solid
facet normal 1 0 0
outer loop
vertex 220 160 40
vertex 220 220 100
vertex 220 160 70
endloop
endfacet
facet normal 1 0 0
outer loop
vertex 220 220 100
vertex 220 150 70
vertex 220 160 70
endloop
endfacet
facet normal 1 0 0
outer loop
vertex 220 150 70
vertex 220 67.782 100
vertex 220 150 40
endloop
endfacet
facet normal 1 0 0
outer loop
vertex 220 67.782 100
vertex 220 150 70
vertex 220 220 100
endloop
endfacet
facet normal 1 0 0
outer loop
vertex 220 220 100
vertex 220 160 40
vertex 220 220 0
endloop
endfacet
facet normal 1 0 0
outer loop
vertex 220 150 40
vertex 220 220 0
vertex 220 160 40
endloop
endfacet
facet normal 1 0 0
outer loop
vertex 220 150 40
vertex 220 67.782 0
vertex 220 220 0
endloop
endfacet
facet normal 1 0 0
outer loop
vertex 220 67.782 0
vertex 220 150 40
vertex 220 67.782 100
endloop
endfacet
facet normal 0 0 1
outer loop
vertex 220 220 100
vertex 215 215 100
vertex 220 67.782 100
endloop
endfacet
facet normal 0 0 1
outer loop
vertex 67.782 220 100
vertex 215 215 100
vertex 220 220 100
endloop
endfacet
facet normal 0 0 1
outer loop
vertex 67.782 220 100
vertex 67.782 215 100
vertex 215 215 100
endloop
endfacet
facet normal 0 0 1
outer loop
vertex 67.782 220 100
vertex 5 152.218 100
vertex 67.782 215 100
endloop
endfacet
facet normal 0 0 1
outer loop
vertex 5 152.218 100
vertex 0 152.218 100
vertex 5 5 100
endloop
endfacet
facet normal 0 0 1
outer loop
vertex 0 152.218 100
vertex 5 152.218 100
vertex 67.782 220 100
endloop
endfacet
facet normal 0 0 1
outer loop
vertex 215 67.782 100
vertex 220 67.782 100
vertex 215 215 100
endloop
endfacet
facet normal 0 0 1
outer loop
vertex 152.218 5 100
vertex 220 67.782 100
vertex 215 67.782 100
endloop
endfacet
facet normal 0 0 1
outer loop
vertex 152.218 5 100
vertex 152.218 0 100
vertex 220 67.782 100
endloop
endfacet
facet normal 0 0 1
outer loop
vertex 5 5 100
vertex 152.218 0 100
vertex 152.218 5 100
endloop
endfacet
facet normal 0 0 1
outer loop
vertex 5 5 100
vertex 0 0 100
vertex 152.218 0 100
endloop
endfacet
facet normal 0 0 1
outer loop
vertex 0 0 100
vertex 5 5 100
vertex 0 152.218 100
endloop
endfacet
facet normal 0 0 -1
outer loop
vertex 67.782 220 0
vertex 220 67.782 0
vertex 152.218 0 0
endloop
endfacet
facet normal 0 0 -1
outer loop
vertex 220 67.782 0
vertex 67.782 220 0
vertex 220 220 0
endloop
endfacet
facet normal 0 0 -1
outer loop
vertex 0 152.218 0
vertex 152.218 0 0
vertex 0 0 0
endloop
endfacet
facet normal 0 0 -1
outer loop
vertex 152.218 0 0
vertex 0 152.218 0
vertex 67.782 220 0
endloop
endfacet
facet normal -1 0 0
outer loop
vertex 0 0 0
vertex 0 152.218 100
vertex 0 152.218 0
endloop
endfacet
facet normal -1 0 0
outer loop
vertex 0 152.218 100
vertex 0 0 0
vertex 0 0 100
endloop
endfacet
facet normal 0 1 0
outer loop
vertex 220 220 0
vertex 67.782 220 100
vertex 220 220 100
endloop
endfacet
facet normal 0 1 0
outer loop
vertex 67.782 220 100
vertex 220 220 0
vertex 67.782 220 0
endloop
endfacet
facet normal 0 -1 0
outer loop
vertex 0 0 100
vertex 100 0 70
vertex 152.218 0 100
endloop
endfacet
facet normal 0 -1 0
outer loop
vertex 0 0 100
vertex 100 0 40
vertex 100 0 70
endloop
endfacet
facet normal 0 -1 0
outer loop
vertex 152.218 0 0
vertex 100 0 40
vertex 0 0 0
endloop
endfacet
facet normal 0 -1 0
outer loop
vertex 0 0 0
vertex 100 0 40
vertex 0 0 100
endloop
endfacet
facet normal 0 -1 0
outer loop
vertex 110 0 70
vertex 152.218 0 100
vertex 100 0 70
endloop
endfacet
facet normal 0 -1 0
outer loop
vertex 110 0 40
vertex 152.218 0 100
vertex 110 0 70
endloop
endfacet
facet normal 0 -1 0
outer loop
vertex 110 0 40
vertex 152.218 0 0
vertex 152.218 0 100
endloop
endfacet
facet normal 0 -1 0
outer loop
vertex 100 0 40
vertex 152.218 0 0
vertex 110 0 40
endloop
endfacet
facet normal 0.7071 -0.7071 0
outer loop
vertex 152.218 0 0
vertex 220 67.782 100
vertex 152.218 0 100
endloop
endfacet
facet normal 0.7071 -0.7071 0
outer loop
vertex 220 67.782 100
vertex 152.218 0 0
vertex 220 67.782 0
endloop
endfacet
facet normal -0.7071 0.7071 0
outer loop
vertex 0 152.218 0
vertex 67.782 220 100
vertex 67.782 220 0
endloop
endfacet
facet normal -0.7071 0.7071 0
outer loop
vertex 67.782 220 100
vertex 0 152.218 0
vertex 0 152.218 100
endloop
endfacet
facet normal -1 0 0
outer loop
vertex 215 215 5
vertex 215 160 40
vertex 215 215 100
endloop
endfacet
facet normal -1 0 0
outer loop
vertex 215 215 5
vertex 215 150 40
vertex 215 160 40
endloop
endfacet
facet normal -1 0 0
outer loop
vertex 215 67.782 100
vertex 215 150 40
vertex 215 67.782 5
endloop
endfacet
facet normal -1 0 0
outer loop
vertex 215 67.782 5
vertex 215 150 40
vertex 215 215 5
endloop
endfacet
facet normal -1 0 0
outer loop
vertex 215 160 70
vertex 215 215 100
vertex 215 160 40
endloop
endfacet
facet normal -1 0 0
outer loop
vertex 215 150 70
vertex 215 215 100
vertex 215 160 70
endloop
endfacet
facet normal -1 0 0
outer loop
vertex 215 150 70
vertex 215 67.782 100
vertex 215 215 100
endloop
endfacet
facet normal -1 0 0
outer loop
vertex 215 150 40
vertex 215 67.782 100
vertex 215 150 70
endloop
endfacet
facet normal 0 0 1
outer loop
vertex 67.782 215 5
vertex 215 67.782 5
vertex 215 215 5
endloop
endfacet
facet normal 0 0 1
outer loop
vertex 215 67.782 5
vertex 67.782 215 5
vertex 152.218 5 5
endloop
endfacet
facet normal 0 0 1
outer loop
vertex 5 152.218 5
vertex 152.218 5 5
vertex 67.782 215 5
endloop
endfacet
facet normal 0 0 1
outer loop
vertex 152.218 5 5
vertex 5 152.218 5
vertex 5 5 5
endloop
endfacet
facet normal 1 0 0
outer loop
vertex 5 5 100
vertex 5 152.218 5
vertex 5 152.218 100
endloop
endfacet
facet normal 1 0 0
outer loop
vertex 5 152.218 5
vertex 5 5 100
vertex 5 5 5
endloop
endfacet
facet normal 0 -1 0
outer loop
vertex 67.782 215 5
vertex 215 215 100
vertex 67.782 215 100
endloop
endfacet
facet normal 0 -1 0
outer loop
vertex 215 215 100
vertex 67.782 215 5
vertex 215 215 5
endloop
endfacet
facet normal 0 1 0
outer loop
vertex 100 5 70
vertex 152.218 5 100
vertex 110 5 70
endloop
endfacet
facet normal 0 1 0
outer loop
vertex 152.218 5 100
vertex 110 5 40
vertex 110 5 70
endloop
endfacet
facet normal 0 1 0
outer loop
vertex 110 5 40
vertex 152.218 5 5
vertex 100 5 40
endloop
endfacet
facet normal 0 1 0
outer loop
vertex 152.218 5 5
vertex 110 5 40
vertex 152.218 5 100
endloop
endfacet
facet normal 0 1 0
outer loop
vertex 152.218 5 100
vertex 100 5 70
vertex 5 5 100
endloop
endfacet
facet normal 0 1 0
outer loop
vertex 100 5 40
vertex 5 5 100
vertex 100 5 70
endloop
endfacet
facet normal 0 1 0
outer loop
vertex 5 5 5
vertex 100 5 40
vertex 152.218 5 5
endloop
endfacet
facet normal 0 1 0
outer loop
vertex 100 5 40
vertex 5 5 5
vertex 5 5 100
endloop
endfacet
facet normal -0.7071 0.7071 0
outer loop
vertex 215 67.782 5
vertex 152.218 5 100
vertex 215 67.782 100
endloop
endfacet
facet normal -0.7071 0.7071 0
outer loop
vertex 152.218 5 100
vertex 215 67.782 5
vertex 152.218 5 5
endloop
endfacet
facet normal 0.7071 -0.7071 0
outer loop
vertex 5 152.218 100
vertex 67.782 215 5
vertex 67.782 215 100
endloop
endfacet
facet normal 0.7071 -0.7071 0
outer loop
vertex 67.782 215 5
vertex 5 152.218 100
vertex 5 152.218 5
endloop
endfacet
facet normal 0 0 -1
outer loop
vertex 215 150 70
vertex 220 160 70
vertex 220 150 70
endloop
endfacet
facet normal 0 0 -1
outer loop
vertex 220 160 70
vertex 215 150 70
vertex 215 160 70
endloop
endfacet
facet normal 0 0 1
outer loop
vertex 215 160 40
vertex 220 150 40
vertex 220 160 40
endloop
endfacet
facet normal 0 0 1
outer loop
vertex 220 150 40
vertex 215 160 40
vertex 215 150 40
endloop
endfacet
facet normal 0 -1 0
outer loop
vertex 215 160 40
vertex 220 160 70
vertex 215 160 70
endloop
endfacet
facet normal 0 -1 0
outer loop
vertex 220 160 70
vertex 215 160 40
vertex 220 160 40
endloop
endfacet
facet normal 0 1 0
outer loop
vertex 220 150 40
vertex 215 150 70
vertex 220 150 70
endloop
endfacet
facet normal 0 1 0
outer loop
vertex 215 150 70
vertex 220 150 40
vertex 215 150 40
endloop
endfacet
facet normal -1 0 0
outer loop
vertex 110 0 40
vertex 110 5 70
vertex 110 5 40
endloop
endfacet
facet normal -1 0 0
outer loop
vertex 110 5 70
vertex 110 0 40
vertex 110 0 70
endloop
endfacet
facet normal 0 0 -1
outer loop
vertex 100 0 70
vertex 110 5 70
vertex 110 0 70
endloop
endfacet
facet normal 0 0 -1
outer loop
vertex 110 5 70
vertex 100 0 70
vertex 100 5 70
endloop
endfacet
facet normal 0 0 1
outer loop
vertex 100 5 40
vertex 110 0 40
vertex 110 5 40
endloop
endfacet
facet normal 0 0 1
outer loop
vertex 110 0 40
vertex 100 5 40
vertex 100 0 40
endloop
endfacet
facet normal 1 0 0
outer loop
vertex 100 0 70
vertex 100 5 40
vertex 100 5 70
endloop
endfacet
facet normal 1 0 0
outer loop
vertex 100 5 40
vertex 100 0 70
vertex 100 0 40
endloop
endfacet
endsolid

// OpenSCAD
difference () { 
    difference() {
        difference () {
    cube([220,220,100]);
            translate([230,0,50]) rotate([0,0,45]) cube([110,110,110],center = true);
            translate([0,230,50]) rotate([0,0,45]) cube([110,110,110],center = true);
            }
        difference () {
            translate([5,5,5]) cube([210,210,100]);
            translate([225,0,50]) rotate([0,0,45]) cube([110,110,110],center = true);
            translate([0,225,50]) rotate([0,0,45]) cube([110,110,110],center = true);
            }
            }
            translate([205,150,40]) cube([30,10,30]);
            translate([100,-5,40]) cube([10,30,30]);
            
        }
        
